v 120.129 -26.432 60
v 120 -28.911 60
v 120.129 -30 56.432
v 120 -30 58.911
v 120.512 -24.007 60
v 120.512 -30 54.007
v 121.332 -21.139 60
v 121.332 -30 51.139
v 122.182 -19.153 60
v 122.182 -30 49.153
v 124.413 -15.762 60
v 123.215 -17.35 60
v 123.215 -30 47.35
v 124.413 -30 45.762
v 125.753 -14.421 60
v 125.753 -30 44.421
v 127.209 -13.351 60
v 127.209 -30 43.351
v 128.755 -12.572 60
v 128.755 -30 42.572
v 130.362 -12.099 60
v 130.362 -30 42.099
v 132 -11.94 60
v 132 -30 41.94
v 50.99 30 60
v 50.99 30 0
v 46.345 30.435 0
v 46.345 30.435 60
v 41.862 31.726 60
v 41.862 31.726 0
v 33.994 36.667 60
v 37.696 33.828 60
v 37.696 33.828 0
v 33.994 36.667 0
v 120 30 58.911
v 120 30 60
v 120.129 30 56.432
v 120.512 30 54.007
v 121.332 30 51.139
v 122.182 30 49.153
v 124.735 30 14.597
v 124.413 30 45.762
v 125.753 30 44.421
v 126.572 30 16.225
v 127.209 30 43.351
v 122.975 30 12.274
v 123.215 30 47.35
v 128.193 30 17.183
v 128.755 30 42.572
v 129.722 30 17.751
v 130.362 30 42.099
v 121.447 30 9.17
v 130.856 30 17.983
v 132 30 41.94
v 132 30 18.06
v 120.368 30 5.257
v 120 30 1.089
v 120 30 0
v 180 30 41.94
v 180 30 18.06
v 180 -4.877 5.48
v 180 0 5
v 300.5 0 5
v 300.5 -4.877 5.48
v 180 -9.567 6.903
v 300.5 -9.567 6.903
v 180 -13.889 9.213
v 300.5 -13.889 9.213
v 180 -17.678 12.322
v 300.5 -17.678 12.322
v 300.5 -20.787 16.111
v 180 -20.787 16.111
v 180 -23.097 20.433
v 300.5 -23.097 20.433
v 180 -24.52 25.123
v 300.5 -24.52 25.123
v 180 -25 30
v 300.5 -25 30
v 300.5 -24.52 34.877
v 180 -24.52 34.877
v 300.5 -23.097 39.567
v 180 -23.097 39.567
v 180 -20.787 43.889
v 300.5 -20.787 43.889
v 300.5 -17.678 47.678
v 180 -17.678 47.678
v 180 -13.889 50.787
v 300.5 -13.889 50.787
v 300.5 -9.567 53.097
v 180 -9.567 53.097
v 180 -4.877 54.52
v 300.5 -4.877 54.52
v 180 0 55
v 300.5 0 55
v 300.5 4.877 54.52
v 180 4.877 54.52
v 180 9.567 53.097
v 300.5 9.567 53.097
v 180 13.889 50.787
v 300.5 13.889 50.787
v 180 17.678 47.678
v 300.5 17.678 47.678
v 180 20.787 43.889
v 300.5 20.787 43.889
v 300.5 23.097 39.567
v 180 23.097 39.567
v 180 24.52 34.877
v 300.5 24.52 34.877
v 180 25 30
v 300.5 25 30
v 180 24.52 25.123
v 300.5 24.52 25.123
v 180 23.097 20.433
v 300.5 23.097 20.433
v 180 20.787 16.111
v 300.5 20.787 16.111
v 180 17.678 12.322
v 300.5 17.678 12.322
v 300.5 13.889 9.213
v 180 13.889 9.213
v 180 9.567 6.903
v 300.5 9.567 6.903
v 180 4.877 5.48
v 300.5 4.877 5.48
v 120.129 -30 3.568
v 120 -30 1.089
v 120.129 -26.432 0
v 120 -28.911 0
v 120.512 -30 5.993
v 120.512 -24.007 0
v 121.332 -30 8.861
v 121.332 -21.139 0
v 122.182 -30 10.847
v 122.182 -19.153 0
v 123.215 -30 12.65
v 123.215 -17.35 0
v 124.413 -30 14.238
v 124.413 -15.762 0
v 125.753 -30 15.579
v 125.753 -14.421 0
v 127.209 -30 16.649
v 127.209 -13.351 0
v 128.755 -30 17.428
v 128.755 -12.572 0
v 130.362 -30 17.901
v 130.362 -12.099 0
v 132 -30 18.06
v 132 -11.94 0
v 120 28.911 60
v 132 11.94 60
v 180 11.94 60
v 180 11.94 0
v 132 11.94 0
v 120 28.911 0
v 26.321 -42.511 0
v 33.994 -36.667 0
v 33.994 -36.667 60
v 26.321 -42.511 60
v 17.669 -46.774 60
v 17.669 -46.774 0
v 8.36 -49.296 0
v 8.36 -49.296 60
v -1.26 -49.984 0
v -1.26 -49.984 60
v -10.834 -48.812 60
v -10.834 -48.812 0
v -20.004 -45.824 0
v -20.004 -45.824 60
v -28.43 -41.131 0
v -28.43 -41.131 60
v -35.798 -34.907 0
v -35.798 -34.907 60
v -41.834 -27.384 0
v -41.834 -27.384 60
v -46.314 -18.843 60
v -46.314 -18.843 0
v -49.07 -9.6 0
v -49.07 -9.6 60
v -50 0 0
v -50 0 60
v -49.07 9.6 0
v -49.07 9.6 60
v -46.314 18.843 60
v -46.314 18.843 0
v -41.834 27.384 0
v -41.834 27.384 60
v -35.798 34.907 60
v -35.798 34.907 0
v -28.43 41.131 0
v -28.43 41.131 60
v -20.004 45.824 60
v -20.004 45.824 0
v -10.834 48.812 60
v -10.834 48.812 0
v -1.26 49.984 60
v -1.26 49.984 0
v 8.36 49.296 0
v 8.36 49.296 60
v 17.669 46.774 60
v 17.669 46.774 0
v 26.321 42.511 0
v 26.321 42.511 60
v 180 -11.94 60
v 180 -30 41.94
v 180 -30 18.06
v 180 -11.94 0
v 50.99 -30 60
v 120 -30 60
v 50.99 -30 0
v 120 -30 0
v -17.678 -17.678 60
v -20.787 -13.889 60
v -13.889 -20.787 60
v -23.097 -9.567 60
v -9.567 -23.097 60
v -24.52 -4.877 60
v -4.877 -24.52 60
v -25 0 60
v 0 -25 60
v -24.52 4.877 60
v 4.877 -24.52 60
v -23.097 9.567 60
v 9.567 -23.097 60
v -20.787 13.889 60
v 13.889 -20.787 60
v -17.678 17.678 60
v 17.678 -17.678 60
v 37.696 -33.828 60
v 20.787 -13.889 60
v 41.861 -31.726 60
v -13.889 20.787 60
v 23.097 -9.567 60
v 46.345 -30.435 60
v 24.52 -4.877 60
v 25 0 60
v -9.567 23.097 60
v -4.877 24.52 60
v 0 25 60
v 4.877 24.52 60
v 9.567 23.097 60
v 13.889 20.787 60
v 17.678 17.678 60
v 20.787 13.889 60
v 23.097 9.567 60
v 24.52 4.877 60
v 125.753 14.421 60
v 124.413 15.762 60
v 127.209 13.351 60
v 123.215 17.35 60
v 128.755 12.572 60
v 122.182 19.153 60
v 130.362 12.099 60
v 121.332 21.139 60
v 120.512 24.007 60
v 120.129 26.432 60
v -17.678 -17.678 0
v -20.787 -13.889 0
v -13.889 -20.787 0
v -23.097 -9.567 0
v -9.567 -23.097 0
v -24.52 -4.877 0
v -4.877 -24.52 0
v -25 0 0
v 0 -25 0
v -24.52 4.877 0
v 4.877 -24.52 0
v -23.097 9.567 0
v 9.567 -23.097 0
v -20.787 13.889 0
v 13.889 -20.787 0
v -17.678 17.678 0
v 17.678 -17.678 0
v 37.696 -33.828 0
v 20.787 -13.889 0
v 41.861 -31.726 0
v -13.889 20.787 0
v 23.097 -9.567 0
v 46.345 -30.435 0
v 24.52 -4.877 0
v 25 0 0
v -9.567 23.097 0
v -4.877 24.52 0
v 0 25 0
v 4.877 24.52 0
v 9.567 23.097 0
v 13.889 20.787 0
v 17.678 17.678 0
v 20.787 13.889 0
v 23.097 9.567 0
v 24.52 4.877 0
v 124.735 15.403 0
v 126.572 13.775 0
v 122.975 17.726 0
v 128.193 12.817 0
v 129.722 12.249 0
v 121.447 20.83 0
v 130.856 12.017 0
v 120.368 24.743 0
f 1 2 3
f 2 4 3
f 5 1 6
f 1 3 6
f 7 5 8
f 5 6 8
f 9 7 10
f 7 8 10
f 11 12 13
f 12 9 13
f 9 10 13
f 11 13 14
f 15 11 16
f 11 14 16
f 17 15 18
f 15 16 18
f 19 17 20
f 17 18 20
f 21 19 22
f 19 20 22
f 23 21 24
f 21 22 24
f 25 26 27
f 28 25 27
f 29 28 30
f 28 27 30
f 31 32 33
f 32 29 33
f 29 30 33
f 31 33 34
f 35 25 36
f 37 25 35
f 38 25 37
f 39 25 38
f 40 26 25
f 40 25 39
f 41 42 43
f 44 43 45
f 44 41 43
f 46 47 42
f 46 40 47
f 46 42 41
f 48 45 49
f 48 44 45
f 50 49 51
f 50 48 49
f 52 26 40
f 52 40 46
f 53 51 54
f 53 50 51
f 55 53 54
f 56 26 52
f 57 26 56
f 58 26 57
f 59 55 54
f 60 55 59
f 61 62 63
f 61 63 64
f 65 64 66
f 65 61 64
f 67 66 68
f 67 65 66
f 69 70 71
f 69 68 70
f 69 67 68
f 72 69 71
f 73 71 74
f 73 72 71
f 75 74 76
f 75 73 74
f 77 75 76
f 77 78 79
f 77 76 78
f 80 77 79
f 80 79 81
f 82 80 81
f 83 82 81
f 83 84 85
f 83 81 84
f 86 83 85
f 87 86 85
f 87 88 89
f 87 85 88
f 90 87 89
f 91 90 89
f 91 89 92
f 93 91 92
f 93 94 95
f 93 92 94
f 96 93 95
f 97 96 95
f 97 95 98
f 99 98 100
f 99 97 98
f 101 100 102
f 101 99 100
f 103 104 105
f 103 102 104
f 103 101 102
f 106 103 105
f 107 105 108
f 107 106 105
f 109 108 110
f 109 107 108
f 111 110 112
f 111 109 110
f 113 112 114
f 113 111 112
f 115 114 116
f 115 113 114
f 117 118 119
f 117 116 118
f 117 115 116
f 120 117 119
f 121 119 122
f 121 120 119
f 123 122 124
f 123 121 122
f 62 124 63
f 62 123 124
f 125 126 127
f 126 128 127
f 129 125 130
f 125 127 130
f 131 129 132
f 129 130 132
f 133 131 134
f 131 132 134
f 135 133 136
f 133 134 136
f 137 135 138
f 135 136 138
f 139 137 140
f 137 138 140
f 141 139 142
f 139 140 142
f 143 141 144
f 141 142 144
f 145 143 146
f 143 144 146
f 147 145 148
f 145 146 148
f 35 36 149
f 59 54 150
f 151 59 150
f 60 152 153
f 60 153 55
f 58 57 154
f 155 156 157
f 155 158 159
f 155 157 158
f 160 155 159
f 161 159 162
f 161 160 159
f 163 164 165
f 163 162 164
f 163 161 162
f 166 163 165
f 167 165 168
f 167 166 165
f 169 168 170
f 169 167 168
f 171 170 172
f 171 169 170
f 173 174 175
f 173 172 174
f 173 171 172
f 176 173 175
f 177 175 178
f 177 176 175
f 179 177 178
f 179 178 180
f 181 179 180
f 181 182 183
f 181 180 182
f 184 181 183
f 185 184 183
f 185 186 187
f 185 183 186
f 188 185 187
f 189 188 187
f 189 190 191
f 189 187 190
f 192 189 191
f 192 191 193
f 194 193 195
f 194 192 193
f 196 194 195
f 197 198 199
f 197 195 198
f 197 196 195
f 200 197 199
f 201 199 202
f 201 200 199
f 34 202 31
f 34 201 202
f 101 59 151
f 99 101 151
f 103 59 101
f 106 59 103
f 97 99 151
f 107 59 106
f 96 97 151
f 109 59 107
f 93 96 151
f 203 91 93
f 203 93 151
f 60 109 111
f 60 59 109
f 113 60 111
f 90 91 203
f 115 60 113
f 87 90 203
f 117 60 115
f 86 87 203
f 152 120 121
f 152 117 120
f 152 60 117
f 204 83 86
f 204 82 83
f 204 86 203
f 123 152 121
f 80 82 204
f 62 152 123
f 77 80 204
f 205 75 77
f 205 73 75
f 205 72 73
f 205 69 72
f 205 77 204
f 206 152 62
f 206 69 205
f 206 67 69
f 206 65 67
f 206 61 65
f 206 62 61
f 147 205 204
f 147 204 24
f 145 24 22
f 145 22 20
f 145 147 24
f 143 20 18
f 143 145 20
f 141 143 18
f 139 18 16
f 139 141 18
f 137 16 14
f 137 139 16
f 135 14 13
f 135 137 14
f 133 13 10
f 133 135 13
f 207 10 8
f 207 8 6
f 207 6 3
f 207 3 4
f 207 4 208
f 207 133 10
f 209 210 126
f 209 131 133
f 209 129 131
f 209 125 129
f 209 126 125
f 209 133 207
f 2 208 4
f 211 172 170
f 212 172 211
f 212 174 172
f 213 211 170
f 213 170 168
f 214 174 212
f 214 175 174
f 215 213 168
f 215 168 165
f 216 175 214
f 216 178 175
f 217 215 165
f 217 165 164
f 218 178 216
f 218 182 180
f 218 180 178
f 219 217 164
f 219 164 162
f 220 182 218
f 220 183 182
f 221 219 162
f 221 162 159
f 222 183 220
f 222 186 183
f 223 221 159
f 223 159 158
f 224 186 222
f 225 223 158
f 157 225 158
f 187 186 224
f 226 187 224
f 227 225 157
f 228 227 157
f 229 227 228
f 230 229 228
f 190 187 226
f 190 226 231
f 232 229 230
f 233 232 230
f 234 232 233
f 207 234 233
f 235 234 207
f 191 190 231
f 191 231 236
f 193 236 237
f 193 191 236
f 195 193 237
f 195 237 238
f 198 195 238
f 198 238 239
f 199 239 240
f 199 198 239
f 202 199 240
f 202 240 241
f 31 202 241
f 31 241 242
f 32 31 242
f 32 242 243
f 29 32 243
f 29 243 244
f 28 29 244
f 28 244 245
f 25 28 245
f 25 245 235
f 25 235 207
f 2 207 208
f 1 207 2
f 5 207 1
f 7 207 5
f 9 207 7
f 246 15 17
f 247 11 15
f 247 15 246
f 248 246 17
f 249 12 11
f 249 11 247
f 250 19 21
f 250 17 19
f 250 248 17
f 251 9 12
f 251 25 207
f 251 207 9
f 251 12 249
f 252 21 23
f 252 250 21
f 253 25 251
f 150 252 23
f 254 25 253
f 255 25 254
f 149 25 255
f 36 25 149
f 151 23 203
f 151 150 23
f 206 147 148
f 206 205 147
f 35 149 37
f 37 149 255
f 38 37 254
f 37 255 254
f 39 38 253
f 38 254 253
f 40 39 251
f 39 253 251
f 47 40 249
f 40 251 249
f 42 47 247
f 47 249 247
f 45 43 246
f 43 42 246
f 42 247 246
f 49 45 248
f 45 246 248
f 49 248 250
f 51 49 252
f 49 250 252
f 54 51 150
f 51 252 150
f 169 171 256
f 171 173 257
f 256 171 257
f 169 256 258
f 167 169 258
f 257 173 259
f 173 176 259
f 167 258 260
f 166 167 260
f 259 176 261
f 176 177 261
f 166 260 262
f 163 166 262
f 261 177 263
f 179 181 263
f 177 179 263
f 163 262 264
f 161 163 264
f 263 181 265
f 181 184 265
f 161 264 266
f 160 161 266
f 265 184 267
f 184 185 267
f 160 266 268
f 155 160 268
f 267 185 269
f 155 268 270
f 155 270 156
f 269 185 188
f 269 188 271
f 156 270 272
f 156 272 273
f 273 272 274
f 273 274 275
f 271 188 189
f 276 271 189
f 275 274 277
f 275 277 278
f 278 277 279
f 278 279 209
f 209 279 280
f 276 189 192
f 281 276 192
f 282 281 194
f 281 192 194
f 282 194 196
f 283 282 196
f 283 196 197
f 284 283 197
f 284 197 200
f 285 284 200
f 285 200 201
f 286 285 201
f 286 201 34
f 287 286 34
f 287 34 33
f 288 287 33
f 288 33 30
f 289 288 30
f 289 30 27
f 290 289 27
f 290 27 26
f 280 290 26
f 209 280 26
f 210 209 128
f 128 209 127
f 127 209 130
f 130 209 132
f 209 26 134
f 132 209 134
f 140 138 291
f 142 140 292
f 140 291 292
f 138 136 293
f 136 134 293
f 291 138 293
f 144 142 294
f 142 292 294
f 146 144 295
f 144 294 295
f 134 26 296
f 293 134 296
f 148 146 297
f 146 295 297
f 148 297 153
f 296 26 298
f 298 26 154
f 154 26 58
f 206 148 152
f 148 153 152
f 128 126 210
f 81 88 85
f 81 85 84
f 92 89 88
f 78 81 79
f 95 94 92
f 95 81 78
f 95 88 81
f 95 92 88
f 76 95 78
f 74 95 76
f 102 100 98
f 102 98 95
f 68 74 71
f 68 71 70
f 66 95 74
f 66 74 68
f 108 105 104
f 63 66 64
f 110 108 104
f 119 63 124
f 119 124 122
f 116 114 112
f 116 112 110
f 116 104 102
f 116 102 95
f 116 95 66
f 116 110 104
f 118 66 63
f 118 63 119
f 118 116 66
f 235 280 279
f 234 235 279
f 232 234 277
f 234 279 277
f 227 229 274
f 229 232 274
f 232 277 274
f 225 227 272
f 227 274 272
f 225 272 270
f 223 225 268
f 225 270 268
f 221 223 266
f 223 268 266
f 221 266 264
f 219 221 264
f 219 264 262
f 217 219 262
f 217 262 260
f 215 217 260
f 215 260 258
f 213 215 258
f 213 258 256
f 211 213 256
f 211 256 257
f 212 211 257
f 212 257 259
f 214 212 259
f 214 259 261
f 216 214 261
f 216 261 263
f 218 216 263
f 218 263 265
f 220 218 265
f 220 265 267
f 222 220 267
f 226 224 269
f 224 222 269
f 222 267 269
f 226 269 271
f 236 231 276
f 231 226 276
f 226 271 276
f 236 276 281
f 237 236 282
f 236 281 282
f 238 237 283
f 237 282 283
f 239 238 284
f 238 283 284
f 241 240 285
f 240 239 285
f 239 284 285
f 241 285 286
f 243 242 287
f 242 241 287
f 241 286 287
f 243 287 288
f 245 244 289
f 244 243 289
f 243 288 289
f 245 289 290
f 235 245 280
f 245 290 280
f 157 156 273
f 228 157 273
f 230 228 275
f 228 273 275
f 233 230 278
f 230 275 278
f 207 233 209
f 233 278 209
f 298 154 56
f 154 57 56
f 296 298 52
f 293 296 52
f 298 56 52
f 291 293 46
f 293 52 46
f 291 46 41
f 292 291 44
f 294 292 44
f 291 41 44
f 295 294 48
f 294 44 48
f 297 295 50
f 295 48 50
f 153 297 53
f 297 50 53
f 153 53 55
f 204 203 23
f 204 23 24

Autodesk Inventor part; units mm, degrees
ref_plane "YZ Plane" through (0, 0, 0) normal (1, 0, 0) x (0, 1, 0)
ref_plane "XZ Plane" through (0, 0, 0) normal (0, 1, 0) x (-1, 0, 0)
ref_plane "XY Plane" through (0, 0, 0) normal (0, 0, 1) x (1, 0, 0)
sketch "Boceto1" plane through (0, 0, 0) normal (0, 0, 1) x (1, 0, 0)
  arc A0 (33.9935, 36.6667) -> (33.9935, -36.6667) centre (0, 0) ccw
  circle A1 centre (0, 0) radius 25
  line L0 (50.9902, 30) -> (180, 30)
  line L1 (180, 30) -> (180, -30)
  line L2 (180, -30) -> (50.9902, -30)
  arc A2 (33.9935, 36.6667) -> (50.9902, 30) centre (50.9902, 55) ccw
  arc A3 (50.9902, -30) -> (33.9935, -36.6667) centre (50.9902, -55) ccw
  dimension "d0" = 100
  dimension "d1" = 50
  dimension "d6" = 50
  dimension "d7" = 50
extrude "Extrusión1" add sketch "Boceto1" along normal blind 60
sketch "Boceto2" plane through (180, -30, 0) normal (1, 0, 0) x (0, 0, -1)
  line L0 (0, 60) -> (-60, 60) projected
  line L1 (0, 0) -> (0, 60) projected
  line L2 (0, 60) -> (-18.06, 60)
  line L3 (0, 60) -> (0, 41.94)
  line L4 (0, 80) -> (0, -20) projected
  line L5 (0, 41.94) -> (-18.06, 60)
  line L6 (-41.94, 60) -> (-60, 41.94)
  line L7 (-60, 60) -> (-60, 41.94)
  line L8 (-60, 60) -> (-41.94, 60)
  line L9 (-60, 18.06) -> (-41.94, 0)
  line L10 (-60, 0) -> (-41.94, 0)
  line L11 (-60, 0) -> (-60, 18.06)
  line L12 (-18.06, 0) -> (0, 18.06)
  line L13 (0, 0) -> (0, 18.06)
  line L14 (0, 0) -> (-18.06, 0)
  point P0 (0, 30)
  point P1 (-30, 30)
  point P2 (-30, 60)
  point P3 (0, 30)
  point P4 (0, 66.6667)
  point P5 (0, -6.6667)
  dimension "d11" = 18.06
  dimension "d12" = 18.06
  dimension "d15" = 360
extrude "Extrusión3" cut sketch "Boceto2" against normal blind 60
sketch "Boceto3" plane through (180, -11.94, 0) normal (1, 0, 0) x (0, 0, -1)
  circle A0 centre (-30, 11.94) radius 25
  line L0 (-18.06, 41.94) -> (-41.94, 41.94) projected
  line L1 (0, 0) -> (0, 23.88) projected
  point P0 (0, 11.94)
  point P1 (-30, 41.94)
  point P2 (0, 11.94)
  dimension "d21" = 50
extrude "Extrusión4" add sketch "Boceto3" along normal blind 120.5
fillet "Empalme1" radius 12 4 edges at (120, 20.97, 50.97) (120, 20.97, 9.03) (120, -20.97, 9.03) (120, -20.97, 50.97)
properties part number "Eye end" material "Stainless Steel, 440C"
